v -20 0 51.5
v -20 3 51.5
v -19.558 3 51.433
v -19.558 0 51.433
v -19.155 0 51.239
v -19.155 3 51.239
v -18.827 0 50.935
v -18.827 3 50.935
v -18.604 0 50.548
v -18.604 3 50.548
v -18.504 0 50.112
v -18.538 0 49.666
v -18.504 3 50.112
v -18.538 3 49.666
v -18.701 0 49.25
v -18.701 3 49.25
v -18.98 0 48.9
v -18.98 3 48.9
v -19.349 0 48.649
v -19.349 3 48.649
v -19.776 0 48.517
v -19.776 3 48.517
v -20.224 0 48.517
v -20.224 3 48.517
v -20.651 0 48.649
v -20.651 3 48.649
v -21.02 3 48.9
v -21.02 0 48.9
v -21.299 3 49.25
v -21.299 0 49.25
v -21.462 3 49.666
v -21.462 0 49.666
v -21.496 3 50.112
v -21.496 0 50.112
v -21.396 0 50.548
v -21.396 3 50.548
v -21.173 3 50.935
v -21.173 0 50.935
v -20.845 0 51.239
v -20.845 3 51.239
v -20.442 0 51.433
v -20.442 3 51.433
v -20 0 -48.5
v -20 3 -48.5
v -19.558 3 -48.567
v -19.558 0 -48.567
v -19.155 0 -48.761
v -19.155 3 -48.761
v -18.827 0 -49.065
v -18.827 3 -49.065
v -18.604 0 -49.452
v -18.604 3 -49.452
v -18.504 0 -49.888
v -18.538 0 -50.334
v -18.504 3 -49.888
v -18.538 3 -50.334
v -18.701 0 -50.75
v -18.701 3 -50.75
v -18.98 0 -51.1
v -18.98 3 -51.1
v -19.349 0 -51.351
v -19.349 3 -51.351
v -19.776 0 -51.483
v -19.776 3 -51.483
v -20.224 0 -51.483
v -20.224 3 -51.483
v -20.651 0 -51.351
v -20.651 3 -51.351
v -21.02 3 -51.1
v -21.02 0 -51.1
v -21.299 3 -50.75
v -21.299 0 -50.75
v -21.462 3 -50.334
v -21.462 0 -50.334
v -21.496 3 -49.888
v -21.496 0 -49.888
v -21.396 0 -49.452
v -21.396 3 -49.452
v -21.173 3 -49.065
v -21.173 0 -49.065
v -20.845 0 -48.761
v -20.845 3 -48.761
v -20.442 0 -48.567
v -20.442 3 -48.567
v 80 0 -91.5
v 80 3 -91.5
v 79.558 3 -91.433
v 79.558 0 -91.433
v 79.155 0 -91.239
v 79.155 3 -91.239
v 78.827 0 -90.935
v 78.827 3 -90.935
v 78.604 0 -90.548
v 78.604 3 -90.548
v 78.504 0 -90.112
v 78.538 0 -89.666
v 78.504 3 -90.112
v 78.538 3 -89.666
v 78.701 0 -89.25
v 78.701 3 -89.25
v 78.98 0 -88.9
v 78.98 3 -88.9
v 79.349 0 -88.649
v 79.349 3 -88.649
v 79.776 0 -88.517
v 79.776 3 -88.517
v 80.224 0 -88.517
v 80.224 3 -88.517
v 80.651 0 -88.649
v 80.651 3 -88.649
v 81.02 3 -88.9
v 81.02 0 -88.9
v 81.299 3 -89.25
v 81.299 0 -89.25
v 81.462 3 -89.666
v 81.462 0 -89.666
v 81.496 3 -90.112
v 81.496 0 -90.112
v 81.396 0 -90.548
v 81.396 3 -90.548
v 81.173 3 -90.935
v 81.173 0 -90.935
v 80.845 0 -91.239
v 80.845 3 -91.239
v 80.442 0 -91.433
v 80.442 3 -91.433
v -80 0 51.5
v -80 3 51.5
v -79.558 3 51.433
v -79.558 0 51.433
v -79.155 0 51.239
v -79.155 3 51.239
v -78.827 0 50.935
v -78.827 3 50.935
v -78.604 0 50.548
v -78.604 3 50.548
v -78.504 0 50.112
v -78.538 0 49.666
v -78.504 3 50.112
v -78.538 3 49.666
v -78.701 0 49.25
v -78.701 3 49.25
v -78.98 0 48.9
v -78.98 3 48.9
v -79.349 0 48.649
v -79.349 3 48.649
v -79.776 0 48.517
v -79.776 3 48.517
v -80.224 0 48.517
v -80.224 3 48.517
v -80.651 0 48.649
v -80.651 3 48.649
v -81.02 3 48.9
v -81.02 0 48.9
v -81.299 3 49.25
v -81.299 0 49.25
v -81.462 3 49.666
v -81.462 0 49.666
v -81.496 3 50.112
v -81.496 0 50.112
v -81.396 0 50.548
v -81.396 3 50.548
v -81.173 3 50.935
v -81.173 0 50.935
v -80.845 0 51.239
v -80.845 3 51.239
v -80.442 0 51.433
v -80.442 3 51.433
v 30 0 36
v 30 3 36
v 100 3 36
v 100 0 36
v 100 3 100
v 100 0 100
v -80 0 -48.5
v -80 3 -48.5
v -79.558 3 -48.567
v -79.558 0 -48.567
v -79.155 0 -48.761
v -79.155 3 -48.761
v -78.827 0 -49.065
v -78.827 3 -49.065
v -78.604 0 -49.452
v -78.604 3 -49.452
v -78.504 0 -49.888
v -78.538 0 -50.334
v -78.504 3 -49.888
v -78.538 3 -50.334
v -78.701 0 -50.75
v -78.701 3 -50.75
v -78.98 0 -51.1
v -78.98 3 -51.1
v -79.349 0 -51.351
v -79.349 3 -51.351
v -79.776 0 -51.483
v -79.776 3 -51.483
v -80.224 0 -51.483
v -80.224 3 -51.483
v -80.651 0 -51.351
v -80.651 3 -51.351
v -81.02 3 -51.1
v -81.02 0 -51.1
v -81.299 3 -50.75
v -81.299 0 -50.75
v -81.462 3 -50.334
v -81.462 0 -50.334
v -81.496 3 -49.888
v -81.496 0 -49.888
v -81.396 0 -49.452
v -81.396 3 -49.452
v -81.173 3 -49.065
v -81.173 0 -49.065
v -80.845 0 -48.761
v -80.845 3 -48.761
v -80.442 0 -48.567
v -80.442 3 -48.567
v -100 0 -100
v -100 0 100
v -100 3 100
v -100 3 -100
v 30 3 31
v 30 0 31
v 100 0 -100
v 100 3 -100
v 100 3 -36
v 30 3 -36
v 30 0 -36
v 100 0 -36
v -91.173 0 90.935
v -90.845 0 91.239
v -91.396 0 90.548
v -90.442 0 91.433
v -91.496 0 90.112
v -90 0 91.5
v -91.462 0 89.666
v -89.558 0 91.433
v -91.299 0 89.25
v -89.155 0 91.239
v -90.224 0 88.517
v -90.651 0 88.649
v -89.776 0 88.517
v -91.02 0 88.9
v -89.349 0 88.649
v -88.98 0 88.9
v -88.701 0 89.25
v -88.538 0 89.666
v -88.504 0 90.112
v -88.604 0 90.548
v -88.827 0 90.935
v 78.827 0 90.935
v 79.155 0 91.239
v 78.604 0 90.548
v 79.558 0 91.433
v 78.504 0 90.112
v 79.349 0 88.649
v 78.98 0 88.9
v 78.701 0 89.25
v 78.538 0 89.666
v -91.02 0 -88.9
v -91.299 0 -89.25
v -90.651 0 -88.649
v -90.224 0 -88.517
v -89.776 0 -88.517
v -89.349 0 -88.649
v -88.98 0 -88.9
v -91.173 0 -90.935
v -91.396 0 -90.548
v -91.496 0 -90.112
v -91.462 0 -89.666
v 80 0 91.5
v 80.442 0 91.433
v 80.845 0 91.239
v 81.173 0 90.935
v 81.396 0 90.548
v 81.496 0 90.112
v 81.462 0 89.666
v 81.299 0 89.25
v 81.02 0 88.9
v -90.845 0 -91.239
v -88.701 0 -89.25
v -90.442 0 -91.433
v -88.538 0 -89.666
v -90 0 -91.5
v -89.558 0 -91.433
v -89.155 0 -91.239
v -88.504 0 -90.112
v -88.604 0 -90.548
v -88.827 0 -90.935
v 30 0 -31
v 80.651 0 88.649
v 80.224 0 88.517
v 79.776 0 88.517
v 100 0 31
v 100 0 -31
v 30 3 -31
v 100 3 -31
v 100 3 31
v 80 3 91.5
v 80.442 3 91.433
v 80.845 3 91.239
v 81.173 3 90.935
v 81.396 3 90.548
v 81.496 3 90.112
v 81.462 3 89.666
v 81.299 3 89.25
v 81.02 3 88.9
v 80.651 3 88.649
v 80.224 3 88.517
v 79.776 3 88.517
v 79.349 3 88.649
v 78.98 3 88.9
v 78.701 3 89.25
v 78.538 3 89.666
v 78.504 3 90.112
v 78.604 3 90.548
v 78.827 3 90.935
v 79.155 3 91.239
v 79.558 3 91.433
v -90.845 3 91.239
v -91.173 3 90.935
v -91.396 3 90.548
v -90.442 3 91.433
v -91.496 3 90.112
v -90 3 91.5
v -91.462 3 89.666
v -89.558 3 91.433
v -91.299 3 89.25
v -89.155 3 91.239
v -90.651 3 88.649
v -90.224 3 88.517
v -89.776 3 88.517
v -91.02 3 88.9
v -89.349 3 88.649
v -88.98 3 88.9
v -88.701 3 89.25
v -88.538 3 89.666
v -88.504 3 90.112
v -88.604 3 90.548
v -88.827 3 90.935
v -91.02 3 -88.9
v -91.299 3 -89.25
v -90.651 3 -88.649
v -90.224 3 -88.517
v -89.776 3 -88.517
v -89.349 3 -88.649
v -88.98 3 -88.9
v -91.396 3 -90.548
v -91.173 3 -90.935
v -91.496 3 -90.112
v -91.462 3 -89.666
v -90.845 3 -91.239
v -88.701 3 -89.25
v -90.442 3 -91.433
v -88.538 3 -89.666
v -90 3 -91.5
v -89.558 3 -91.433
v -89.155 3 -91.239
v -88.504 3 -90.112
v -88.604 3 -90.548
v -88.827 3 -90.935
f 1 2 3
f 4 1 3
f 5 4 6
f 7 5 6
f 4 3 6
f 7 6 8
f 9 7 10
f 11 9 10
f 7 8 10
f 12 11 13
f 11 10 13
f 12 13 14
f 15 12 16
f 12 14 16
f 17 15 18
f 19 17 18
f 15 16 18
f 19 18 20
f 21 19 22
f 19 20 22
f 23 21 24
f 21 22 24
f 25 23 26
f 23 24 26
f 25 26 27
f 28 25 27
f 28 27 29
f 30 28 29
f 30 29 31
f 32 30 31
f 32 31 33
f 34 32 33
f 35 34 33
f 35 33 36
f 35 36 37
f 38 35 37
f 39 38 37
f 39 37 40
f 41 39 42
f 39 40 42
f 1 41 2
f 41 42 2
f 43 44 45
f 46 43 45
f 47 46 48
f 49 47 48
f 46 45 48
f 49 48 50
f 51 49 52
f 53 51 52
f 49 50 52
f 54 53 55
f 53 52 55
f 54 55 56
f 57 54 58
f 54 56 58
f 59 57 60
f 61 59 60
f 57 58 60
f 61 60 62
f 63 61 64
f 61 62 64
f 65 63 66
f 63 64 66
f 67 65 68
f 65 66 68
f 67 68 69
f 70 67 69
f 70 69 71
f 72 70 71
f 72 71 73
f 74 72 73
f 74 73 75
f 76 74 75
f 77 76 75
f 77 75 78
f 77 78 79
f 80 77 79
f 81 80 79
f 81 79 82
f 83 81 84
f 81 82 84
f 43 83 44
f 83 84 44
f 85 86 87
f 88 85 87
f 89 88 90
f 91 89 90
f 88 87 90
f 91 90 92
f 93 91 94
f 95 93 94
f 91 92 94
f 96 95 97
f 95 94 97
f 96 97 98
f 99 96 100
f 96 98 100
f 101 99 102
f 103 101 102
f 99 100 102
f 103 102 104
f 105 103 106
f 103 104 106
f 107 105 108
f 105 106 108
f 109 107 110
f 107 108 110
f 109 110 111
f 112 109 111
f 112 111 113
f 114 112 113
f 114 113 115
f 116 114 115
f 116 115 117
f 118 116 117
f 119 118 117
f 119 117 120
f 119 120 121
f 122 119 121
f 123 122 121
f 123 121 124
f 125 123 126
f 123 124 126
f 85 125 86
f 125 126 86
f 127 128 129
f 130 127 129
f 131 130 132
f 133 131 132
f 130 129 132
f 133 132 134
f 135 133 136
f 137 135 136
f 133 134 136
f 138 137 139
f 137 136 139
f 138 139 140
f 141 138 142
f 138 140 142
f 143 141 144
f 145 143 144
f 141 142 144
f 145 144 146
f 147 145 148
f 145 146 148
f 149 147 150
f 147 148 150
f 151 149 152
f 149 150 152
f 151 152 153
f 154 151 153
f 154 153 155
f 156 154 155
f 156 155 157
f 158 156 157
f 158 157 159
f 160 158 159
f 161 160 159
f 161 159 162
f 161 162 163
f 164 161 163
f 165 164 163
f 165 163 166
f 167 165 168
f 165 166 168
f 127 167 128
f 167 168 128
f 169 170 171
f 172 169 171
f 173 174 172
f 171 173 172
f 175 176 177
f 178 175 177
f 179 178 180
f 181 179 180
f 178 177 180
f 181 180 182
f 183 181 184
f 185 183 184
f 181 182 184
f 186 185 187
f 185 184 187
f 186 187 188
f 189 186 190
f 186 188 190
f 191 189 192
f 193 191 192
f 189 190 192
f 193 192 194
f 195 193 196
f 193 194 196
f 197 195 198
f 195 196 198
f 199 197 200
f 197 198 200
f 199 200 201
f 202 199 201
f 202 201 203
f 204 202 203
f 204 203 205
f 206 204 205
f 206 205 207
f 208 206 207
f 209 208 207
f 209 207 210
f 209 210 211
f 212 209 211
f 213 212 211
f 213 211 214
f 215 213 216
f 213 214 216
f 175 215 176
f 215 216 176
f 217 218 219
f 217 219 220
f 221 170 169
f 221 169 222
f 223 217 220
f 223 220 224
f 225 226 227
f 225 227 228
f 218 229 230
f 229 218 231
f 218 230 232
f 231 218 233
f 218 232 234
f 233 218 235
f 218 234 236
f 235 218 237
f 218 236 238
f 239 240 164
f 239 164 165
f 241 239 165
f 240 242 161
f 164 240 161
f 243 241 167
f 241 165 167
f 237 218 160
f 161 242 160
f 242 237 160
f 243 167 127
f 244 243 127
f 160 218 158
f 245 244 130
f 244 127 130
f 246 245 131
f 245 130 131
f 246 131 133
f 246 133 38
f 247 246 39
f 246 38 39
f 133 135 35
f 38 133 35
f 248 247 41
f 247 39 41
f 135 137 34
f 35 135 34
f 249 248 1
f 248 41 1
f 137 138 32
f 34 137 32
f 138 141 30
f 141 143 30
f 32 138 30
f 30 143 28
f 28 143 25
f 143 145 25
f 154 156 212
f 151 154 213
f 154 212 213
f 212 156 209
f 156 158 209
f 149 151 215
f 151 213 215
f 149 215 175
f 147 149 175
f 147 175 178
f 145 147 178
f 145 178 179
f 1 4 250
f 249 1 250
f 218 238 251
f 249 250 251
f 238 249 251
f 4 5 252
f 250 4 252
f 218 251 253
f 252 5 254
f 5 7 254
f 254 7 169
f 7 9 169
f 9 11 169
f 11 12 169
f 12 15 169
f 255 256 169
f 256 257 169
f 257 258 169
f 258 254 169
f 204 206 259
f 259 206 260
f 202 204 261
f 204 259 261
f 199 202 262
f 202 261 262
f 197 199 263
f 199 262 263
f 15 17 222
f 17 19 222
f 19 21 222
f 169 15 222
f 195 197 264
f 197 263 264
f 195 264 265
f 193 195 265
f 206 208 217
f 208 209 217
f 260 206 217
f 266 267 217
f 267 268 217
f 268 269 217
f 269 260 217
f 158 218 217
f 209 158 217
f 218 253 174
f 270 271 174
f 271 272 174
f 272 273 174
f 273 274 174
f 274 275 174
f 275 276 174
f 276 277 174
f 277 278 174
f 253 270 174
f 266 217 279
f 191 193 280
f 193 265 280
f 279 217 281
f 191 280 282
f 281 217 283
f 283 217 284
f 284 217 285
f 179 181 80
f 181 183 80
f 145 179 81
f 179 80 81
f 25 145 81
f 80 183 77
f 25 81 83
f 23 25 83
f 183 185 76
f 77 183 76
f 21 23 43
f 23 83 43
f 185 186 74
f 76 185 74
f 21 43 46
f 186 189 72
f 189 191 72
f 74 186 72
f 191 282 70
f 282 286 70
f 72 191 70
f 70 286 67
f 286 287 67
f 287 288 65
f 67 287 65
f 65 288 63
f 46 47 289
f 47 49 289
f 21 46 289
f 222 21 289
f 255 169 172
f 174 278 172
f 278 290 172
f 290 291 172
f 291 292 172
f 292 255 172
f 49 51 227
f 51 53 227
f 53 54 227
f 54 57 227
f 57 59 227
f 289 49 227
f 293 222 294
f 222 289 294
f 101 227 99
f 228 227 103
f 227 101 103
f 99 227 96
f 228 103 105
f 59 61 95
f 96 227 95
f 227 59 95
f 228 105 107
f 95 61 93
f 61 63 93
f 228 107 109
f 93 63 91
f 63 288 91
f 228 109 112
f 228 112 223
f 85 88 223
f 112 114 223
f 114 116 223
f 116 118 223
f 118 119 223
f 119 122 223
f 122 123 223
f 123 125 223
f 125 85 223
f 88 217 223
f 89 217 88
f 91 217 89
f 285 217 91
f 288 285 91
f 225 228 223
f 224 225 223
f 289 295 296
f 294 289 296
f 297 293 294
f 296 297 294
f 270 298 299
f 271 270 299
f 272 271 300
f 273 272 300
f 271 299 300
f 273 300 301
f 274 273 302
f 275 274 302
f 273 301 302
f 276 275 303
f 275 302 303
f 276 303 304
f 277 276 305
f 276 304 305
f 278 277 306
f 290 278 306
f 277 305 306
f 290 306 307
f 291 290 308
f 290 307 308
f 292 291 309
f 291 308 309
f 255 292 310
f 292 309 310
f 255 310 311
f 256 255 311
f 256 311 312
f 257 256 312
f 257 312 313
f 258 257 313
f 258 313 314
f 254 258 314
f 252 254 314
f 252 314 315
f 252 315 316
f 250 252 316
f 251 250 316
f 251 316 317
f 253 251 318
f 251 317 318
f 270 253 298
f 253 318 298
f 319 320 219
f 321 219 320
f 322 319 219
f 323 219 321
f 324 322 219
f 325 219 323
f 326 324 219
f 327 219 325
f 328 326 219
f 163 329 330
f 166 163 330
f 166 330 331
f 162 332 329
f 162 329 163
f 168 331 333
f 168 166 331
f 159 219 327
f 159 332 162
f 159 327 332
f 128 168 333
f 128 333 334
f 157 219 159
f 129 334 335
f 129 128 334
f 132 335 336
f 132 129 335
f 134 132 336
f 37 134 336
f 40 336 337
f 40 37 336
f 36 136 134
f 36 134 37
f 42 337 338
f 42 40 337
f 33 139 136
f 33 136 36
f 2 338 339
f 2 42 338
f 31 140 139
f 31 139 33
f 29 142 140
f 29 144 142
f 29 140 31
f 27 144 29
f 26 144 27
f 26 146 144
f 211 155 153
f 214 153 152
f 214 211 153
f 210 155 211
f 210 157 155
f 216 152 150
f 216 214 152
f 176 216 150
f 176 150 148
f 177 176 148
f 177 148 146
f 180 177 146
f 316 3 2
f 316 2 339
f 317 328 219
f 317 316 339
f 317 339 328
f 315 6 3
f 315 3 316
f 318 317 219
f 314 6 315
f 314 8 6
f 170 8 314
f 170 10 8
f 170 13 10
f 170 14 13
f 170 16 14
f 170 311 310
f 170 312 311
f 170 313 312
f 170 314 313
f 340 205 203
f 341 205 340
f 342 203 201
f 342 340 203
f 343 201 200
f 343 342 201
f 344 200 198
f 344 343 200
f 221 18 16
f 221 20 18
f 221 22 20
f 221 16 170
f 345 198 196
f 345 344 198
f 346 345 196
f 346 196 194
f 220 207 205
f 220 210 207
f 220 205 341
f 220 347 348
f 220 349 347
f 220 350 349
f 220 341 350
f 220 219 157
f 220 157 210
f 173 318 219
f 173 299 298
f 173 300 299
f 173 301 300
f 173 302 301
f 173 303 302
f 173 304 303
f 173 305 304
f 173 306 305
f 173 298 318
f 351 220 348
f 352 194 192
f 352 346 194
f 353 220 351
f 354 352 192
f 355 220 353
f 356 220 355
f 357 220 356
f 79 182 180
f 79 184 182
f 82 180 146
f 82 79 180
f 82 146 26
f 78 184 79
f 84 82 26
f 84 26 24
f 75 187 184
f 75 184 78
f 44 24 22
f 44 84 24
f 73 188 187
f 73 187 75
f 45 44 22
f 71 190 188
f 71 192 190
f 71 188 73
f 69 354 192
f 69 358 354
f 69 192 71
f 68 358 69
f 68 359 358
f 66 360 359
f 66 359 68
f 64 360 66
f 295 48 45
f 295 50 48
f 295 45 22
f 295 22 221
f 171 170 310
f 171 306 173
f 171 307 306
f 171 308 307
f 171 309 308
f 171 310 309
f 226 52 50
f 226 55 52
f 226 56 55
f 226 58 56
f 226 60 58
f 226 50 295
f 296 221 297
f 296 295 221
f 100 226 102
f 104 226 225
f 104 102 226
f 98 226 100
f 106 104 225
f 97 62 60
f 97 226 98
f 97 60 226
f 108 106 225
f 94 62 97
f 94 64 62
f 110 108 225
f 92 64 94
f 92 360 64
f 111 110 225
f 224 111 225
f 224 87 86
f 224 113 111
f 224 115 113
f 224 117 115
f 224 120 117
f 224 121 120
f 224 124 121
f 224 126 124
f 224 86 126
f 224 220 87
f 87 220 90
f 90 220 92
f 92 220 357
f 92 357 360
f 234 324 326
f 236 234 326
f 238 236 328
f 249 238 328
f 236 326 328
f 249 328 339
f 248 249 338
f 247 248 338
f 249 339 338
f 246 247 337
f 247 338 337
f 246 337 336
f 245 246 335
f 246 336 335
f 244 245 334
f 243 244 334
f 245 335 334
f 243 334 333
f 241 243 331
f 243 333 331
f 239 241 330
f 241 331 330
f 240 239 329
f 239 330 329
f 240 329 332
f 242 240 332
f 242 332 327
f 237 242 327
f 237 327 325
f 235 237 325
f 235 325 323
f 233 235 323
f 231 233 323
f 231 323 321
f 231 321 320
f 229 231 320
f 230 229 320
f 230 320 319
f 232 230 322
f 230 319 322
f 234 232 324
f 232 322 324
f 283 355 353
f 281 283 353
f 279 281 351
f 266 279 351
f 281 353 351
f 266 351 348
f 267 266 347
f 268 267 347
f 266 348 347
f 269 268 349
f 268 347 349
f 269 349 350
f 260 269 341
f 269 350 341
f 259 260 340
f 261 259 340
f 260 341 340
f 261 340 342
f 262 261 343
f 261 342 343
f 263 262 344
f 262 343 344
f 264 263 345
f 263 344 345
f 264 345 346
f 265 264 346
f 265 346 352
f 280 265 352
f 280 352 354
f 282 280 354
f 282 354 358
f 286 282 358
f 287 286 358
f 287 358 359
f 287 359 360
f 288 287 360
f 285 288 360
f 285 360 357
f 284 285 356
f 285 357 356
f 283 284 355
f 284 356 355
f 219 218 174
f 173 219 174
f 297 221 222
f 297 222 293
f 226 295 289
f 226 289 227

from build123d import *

# Parameters (mm, degrees)
SKETCH1_W           = 200
SKETCH1_H           = 200
BOSS_EXTRUDE1_DEPTH = 3
SKETCH2_R           = 1.5
CUT_EXTRUDE1_DEPTH  = 3
SKETCH3_W           = 70
SKETCH3_H           = 5
CUT_EXTRUDE2_DEPTH  = 3
SKETCH4_R           = 1.5
CUT_EXTRUDE5_DEPTH  = 3


with BuildPart() as part:
    # Sketch1 → Boss-Extrude1 (new body)
    with BuildSketch(Plane(origin=(0, 0, 0), x_dir=(1, 0, 0), z_dir=(0, 1, 0))):
        Rectangle(SKETCH1_W, SKETCH1_H)
    extrude(amount=BOSS_EXTRUDE1_DEPTH)

    # Sketch2 → Cut-Extrude1 (cut)
    with BuildSketch(Plane(origin=(0, 3, 0), x_dir=(1, 0, 0), z_dir=(0, 1, 0))):
        with Locations(Location((-90, -90, 0), (0, 0, 270))):
            Circle(SKETCH2_R)
        with Locations(Location((80, -90, 0), (0, 0, 270))):
            Circle(SKETCH2_R)
        with Locations(Location((80, 90, 0), (0, 0, 90))):
            Circle(SKETCH2_R)
        with Locations(Location((-90, 90, 0), (0, 0, 90))):
            Circle(SKETCH2_R)
    extrude(amount=-CUT_EXTRUDE1_DEPTH, mode=Mode.SUBTRACT)

    # Sketch3 → Cut-Extrude2 (cut)
    with BuildSketch(Plane(origin=(0, 3, 0), x_dir=(1, 0, 0), z_dir=(0, 1, 0))):
        with Locations((65, -33.5)):
            Rectangle(SKETCH3_W, SKETCH3_H)
        with Locations((65, 33.5)):
            Rectangle(SKETCH3_W, SKETCH3_H)
    extrude(amount=-CUT_EXTRUDE2_DEPTH, mode=Mode.SUBTRACT)

    # Sketch4 → Cut-Extrude5 (cut)
    with BuildSketch(Plane(origin=(0, 3, 0), x_dir=(1, 0, 0), z_dir=(0, 1, 0))):
        with Locations(Location((-80, -50, 0), (0, 0, 270))):
            Circle(SKETCH4_R)
        with Locations(Location((-20, -50, 0), (0, 0, 270))):
            Circle(SKETCH4_R)
        with Locations(Location((-80, 50, 0), (0, 0, 270))):
            Circle(SKETCH4_R)
        with Locations(Location((-20, 50, 0), (0, 0, 270))):
            Circle(SKETCH4_R)
    extrude(amount=-CUT_EXTRUDE5_DEPTH, mode=Mode.SUBTRACT)


solid = part.part
